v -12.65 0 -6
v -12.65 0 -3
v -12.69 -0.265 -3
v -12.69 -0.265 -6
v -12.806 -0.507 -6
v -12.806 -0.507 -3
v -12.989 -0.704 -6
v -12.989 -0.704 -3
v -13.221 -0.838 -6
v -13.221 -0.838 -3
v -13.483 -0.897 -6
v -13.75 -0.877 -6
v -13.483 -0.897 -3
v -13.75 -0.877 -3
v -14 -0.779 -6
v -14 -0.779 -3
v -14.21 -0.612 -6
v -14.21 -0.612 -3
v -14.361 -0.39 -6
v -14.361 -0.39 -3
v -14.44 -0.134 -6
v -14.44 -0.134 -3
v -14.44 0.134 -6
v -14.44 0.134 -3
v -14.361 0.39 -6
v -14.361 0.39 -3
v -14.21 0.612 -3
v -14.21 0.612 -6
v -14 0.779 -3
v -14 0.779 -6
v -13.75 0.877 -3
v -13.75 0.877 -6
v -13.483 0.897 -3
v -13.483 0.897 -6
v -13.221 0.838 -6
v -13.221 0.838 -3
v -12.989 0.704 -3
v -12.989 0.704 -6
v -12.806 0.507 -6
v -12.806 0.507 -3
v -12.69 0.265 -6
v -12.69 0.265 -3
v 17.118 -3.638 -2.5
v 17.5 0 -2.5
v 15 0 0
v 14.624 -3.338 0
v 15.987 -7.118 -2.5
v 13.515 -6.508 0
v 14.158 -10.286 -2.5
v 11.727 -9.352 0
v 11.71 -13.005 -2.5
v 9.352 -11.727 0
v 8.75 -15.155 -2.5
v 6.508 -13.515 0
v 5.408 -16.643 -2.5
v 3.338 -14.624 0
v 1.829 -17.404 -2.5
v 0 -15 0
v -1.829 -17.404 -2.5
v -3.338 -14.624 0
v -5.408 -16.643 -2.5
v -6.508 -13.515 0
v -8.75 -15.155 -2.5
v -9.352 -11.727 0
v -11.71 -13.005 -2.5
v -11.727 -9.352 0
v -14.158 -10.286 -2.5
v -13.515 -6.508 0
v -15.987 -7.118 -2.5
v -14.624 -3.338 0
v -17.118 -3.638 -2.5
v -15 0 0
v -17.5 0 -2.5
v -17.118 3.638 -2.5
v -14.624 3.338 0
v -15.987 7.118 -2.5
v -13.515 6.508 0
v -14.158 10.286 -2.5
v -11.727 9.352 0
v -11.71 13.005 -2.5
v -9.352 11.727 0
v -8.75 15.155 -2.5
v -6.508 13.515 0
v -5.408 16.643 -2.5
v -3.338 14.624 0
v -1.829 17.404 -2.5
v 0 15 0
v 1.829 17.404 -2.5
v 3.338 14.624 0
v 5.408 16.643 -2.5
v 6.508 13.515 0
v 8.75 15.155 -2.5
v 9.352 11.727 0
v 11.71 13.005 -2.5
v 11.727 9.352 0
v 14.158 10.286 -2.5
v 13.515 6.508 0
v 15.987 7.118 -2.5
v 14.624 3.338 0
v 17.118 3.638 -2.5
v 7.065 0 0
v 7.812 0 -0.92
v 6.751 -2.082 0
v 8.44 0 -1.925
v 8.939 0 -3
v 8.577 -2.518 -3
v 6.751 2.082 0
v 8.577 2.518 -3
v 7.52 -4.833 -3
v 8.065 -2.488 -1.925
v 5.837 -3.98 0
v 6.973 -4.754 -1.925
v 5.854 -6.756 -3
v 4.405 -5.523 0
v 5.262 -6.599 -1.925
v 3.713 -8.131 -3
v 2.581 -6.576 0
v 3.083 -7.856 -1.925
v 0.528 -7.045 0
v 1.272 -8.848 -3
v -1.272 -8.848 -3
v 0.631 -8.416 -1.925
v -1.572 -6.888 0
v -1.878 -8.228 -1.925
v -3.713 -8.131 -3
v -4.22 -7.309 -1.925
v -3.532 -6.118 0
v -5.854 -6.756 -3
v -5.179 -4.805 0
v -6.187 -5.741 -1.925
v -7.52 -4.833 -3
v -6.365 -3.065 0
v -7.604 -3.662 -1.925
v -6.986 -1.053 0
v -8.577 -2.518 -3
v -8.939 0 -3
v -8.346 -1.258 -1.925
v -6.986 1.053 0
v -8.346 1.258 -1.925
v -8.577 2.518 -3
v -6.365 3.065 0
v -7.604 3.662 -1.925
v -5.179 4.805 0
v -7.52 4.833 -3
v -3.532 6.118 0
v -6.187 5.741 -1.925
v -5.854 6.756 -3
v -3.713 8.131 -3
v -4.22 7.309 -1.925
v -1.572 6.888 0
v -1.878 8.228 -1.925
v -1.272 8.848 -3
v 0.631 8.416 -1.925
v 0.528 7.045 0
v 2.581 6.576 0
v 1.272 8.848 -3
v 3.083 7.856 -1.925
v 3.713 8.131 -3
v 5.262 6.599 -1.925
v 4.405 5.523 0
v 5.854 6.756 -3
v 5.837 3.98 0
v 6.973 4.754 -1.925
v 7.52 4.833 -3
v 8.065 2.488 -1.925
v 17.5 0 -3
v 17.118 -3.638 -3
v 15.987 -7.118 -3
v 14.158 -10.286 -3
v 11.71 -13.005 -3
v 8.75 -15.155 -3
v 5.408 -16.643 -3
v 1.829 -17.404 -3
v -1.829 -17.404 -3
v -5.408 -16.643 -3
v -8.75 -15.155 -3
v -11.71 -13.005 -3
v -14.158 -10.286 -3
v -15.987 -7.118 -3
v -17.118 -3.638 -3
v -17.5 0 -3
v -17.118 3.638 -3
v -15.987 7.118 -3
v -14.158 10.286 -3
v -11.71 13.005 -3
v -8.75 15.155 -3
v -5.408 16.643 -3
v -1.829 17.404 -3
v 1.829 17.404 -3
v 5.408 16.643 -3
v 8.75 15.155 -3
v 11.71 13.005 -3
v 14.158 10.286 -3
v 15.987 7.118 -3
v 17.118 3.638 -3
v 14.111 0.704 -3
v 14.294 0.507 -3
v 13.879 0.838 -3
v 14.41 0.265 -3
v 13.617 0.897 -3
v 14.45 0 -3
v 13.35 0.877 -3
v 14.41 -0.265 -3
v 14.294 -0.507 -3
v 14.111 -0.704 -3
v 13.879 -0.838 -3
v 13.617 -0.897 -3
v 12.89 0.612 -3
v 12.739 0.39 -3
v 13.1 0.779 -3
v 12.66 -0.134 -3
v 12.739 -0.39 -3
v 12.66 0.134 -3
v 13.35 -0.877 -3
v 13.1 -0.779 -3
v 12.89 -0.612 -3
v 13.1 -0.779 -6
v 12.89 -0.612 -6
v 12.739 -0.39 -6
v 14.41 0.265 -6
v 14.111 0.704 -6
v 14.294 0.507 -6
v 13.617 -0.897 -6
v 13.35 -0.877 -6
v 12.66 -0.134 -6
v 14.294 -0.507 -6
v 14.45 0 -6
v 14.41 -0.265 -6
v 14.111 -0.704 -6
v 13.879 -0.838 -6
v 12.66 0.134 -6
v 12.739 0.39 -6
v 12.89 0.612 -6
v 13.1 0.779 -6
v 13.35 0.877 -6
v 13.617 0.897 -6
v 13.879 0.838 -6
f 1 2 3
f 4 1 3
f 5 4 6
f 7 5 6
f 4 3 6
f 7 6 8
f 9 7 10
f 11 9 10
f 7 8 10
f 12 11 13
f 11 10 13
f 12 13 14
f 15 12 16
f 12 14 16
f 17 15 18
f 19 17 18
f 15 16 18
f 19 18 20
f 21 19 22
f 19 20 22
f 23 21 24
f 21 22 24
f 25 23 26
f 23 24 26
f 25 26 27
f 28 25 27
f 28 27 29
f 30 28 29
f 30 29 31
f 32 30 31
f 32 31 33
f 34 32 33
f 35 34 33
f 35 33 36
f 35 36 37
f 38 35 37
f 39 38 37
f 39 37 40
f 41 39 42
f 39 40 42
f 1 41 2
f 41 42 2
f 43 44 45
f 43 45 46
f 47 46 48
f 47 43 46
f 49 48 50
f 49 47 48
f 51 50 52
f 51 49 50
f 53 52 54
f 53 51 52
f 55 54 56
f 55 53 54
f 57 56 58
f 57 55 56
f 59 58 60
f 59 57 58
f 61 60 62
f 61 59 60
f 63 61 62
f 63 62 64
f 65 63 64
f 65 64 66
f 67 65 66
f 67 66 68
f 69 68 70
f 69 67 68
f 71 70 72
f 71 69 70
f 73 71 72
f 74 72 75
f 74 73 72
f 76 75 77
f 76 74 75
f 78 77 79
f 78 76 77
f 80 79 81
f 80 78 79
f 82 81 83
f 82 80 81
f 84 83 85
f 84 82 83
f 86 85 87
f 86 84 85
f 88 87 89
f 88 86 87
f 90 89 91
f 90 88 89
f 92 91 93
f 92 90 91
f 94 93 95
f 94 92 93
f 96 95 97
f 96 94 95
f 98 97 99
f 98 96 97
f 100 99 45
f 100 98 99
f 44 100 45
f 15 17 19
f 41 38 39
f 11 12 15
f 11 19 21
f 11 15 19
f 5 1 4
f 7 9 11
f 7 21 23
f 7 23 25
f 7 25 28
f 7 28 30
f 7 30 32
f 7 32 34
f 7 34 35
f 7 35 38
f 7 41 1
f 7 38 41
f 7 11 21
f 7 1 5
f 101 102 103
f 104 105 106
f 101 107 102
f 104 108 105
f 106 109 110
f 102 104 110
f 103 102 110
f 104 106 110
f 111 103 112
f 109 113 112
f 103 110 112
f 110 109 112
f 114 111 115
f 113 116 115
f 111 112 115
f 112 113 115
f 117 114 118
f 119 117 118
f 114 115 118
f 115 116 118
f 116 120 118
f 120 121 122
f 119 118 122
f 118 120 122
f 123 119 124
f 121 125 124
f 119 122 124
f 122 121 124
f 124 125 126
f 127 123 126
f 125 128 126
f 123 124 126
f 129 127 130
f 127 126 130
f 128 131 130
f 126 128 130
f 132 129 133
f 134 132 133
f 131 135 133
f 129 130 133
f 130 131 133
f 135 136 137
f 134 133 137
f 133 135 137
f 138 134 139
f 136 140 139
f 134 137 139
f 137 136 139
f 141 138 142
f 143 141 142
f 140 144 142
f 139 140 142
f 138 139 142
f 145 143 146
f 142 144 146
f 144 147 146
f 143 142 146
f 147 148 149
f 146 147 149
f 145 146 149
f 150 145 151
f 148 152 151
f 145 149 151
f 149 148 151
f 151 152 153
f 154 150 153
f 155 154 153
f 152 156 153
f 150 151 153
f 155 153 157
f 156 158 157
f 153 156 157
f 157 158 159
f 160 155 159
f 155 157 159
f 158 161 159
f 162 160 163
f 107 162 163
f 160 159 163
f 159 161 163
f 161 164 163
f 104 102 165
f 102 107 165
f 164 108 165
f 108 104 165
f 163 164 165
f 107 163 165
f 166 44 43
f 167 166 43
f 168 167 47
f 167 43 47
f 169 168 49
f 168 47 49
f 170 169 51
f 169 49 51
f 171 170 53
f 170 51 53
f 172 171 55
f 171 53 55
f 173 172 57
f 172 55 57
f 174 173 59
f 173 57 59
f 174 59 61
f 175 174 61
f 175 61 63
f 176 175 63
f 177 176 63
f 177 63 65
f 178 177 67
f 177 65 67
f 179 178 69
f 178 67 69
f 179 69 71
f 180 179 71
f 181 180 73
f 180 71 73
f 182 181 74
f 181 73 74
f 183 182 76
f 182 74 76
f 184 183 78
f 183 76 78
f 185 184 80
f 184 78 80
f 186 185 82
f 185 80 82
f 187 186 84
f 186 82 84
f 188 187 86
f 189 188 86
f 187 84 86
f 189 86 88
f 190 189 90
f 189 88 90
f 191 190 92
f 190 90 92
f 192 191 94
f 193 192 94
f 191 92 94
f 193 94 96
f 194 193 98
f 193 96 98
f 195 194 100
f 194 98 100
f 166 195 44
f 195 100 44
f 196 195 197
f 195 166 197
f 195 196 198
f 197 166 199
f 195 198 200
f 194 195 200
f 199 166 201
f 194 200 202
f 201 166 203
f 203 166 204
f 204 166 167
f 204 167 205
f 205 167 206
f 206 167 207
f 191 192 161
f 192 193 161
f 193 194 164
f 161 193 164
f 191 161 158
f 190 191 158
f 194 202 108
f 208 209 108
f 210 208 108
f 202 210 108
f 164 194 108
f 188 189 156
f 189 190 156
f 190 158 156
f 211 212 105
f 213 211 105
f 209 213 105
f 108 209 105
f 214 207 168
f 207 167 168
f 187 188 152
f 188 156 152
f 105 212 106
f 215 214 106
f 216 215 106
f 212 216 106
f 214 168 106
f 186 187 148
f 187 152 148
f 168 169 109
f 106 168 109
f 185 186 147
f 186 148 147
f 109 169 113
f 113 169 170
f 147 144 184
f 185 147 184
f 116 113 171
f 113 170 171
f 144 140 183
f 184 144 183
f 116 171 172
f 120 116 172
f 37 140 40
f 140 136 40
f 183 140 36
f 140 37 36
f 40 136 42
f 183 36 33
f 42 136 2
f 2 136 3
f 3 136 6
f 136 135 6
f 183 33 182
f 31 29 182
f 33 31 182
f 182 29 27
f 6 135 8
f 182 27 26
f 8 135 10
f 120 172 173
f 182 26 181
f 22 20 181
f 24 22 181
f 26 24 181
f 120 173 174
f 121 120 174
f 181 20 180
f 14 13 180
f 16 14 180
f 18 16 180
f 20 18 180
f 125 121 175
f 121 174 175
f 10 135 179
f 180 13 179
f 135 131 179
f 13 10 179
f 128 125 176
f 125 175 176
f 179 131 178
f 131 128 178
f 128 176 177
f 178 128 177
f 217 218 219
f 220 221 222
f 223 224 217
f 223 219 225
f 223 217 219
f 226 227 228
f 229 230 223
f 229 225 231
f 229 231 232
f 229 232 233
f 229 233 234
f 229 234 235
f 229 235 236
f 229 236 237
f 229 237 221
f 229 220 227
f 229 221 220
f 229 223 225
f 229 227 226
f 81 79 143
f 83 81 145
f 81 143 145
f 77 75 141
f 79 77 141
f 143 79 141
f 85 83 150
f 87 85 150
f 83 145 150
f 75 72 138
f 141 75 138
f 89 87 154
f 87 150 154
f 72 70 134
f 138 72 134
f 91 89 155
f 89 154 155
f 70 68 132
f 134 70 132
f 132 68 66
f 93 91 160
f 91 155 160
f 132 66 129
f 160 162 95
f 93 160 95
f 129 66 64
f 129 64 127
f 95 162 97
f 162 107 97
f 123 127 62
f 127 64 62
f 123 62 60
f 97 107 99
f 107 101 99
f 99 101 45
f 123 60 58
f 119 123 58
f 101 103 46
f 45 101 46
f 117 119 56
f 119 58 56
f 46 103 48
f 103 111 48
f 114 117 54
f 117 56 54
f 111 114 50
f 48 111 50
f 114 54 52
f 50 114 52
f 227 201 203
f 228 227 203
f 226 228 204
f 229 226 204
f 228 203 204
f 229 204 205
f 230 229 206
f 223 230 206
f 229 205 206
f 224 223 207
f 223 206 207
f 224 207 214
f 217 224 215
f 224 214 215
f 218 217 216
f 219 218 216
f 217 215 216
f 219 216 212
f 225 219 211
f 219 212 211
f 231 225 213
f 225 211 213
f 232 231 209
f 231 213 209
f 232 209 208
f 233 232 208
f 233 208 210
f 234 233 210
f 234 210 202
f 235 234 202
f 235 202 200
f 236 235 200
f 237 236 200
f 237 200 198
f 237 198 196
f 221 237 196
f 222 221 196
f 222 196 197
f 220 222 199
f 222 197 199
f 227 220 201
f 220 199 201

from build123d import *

# Parameters (mm, degrees)
F2_SIZE  = 2.5
F3_R     = 0.9
F4_DEPTH = 3


with BuildPart() as f1:
    # F0 (on Front) → F1 (revolve)
    with BuildSketch(Plane.XZ):
        with BuildLine():
            Line((17.5, 0), (7.064701, 0))
            ThreePointArc((7.064701, 0), (8.141347, -1.412911), (8.939239, -3))
            Line((8.939239, -3), (17.5, -3))
            Line((17.5, -3), (17.5, 0))
        make_face()
    revolve(axis=Axis((0, 0, -4.75), (0, 0, -1)))

    # F2
    f2_edges = [f1.edges().sort_by_distance(p)[0] for p in [
        (-17.5, 0, 0),
    ]]
    chamfer(f2_edges, length=F2_SIZE)

    # F3 (on face) → F4 (join)
    with BuildSketch(Plane(origin=(0, 0, -3), x_dir=(1, 0, 0), z_dir=(0, 0, -1))):
        with Locations((-13.55, 0)):
            Circle(F3_R)
        with Locations((13.55, 0)):
            Circle(F3_R)
    extrude(amount=F4_DEPTH)


solid = f1.part
